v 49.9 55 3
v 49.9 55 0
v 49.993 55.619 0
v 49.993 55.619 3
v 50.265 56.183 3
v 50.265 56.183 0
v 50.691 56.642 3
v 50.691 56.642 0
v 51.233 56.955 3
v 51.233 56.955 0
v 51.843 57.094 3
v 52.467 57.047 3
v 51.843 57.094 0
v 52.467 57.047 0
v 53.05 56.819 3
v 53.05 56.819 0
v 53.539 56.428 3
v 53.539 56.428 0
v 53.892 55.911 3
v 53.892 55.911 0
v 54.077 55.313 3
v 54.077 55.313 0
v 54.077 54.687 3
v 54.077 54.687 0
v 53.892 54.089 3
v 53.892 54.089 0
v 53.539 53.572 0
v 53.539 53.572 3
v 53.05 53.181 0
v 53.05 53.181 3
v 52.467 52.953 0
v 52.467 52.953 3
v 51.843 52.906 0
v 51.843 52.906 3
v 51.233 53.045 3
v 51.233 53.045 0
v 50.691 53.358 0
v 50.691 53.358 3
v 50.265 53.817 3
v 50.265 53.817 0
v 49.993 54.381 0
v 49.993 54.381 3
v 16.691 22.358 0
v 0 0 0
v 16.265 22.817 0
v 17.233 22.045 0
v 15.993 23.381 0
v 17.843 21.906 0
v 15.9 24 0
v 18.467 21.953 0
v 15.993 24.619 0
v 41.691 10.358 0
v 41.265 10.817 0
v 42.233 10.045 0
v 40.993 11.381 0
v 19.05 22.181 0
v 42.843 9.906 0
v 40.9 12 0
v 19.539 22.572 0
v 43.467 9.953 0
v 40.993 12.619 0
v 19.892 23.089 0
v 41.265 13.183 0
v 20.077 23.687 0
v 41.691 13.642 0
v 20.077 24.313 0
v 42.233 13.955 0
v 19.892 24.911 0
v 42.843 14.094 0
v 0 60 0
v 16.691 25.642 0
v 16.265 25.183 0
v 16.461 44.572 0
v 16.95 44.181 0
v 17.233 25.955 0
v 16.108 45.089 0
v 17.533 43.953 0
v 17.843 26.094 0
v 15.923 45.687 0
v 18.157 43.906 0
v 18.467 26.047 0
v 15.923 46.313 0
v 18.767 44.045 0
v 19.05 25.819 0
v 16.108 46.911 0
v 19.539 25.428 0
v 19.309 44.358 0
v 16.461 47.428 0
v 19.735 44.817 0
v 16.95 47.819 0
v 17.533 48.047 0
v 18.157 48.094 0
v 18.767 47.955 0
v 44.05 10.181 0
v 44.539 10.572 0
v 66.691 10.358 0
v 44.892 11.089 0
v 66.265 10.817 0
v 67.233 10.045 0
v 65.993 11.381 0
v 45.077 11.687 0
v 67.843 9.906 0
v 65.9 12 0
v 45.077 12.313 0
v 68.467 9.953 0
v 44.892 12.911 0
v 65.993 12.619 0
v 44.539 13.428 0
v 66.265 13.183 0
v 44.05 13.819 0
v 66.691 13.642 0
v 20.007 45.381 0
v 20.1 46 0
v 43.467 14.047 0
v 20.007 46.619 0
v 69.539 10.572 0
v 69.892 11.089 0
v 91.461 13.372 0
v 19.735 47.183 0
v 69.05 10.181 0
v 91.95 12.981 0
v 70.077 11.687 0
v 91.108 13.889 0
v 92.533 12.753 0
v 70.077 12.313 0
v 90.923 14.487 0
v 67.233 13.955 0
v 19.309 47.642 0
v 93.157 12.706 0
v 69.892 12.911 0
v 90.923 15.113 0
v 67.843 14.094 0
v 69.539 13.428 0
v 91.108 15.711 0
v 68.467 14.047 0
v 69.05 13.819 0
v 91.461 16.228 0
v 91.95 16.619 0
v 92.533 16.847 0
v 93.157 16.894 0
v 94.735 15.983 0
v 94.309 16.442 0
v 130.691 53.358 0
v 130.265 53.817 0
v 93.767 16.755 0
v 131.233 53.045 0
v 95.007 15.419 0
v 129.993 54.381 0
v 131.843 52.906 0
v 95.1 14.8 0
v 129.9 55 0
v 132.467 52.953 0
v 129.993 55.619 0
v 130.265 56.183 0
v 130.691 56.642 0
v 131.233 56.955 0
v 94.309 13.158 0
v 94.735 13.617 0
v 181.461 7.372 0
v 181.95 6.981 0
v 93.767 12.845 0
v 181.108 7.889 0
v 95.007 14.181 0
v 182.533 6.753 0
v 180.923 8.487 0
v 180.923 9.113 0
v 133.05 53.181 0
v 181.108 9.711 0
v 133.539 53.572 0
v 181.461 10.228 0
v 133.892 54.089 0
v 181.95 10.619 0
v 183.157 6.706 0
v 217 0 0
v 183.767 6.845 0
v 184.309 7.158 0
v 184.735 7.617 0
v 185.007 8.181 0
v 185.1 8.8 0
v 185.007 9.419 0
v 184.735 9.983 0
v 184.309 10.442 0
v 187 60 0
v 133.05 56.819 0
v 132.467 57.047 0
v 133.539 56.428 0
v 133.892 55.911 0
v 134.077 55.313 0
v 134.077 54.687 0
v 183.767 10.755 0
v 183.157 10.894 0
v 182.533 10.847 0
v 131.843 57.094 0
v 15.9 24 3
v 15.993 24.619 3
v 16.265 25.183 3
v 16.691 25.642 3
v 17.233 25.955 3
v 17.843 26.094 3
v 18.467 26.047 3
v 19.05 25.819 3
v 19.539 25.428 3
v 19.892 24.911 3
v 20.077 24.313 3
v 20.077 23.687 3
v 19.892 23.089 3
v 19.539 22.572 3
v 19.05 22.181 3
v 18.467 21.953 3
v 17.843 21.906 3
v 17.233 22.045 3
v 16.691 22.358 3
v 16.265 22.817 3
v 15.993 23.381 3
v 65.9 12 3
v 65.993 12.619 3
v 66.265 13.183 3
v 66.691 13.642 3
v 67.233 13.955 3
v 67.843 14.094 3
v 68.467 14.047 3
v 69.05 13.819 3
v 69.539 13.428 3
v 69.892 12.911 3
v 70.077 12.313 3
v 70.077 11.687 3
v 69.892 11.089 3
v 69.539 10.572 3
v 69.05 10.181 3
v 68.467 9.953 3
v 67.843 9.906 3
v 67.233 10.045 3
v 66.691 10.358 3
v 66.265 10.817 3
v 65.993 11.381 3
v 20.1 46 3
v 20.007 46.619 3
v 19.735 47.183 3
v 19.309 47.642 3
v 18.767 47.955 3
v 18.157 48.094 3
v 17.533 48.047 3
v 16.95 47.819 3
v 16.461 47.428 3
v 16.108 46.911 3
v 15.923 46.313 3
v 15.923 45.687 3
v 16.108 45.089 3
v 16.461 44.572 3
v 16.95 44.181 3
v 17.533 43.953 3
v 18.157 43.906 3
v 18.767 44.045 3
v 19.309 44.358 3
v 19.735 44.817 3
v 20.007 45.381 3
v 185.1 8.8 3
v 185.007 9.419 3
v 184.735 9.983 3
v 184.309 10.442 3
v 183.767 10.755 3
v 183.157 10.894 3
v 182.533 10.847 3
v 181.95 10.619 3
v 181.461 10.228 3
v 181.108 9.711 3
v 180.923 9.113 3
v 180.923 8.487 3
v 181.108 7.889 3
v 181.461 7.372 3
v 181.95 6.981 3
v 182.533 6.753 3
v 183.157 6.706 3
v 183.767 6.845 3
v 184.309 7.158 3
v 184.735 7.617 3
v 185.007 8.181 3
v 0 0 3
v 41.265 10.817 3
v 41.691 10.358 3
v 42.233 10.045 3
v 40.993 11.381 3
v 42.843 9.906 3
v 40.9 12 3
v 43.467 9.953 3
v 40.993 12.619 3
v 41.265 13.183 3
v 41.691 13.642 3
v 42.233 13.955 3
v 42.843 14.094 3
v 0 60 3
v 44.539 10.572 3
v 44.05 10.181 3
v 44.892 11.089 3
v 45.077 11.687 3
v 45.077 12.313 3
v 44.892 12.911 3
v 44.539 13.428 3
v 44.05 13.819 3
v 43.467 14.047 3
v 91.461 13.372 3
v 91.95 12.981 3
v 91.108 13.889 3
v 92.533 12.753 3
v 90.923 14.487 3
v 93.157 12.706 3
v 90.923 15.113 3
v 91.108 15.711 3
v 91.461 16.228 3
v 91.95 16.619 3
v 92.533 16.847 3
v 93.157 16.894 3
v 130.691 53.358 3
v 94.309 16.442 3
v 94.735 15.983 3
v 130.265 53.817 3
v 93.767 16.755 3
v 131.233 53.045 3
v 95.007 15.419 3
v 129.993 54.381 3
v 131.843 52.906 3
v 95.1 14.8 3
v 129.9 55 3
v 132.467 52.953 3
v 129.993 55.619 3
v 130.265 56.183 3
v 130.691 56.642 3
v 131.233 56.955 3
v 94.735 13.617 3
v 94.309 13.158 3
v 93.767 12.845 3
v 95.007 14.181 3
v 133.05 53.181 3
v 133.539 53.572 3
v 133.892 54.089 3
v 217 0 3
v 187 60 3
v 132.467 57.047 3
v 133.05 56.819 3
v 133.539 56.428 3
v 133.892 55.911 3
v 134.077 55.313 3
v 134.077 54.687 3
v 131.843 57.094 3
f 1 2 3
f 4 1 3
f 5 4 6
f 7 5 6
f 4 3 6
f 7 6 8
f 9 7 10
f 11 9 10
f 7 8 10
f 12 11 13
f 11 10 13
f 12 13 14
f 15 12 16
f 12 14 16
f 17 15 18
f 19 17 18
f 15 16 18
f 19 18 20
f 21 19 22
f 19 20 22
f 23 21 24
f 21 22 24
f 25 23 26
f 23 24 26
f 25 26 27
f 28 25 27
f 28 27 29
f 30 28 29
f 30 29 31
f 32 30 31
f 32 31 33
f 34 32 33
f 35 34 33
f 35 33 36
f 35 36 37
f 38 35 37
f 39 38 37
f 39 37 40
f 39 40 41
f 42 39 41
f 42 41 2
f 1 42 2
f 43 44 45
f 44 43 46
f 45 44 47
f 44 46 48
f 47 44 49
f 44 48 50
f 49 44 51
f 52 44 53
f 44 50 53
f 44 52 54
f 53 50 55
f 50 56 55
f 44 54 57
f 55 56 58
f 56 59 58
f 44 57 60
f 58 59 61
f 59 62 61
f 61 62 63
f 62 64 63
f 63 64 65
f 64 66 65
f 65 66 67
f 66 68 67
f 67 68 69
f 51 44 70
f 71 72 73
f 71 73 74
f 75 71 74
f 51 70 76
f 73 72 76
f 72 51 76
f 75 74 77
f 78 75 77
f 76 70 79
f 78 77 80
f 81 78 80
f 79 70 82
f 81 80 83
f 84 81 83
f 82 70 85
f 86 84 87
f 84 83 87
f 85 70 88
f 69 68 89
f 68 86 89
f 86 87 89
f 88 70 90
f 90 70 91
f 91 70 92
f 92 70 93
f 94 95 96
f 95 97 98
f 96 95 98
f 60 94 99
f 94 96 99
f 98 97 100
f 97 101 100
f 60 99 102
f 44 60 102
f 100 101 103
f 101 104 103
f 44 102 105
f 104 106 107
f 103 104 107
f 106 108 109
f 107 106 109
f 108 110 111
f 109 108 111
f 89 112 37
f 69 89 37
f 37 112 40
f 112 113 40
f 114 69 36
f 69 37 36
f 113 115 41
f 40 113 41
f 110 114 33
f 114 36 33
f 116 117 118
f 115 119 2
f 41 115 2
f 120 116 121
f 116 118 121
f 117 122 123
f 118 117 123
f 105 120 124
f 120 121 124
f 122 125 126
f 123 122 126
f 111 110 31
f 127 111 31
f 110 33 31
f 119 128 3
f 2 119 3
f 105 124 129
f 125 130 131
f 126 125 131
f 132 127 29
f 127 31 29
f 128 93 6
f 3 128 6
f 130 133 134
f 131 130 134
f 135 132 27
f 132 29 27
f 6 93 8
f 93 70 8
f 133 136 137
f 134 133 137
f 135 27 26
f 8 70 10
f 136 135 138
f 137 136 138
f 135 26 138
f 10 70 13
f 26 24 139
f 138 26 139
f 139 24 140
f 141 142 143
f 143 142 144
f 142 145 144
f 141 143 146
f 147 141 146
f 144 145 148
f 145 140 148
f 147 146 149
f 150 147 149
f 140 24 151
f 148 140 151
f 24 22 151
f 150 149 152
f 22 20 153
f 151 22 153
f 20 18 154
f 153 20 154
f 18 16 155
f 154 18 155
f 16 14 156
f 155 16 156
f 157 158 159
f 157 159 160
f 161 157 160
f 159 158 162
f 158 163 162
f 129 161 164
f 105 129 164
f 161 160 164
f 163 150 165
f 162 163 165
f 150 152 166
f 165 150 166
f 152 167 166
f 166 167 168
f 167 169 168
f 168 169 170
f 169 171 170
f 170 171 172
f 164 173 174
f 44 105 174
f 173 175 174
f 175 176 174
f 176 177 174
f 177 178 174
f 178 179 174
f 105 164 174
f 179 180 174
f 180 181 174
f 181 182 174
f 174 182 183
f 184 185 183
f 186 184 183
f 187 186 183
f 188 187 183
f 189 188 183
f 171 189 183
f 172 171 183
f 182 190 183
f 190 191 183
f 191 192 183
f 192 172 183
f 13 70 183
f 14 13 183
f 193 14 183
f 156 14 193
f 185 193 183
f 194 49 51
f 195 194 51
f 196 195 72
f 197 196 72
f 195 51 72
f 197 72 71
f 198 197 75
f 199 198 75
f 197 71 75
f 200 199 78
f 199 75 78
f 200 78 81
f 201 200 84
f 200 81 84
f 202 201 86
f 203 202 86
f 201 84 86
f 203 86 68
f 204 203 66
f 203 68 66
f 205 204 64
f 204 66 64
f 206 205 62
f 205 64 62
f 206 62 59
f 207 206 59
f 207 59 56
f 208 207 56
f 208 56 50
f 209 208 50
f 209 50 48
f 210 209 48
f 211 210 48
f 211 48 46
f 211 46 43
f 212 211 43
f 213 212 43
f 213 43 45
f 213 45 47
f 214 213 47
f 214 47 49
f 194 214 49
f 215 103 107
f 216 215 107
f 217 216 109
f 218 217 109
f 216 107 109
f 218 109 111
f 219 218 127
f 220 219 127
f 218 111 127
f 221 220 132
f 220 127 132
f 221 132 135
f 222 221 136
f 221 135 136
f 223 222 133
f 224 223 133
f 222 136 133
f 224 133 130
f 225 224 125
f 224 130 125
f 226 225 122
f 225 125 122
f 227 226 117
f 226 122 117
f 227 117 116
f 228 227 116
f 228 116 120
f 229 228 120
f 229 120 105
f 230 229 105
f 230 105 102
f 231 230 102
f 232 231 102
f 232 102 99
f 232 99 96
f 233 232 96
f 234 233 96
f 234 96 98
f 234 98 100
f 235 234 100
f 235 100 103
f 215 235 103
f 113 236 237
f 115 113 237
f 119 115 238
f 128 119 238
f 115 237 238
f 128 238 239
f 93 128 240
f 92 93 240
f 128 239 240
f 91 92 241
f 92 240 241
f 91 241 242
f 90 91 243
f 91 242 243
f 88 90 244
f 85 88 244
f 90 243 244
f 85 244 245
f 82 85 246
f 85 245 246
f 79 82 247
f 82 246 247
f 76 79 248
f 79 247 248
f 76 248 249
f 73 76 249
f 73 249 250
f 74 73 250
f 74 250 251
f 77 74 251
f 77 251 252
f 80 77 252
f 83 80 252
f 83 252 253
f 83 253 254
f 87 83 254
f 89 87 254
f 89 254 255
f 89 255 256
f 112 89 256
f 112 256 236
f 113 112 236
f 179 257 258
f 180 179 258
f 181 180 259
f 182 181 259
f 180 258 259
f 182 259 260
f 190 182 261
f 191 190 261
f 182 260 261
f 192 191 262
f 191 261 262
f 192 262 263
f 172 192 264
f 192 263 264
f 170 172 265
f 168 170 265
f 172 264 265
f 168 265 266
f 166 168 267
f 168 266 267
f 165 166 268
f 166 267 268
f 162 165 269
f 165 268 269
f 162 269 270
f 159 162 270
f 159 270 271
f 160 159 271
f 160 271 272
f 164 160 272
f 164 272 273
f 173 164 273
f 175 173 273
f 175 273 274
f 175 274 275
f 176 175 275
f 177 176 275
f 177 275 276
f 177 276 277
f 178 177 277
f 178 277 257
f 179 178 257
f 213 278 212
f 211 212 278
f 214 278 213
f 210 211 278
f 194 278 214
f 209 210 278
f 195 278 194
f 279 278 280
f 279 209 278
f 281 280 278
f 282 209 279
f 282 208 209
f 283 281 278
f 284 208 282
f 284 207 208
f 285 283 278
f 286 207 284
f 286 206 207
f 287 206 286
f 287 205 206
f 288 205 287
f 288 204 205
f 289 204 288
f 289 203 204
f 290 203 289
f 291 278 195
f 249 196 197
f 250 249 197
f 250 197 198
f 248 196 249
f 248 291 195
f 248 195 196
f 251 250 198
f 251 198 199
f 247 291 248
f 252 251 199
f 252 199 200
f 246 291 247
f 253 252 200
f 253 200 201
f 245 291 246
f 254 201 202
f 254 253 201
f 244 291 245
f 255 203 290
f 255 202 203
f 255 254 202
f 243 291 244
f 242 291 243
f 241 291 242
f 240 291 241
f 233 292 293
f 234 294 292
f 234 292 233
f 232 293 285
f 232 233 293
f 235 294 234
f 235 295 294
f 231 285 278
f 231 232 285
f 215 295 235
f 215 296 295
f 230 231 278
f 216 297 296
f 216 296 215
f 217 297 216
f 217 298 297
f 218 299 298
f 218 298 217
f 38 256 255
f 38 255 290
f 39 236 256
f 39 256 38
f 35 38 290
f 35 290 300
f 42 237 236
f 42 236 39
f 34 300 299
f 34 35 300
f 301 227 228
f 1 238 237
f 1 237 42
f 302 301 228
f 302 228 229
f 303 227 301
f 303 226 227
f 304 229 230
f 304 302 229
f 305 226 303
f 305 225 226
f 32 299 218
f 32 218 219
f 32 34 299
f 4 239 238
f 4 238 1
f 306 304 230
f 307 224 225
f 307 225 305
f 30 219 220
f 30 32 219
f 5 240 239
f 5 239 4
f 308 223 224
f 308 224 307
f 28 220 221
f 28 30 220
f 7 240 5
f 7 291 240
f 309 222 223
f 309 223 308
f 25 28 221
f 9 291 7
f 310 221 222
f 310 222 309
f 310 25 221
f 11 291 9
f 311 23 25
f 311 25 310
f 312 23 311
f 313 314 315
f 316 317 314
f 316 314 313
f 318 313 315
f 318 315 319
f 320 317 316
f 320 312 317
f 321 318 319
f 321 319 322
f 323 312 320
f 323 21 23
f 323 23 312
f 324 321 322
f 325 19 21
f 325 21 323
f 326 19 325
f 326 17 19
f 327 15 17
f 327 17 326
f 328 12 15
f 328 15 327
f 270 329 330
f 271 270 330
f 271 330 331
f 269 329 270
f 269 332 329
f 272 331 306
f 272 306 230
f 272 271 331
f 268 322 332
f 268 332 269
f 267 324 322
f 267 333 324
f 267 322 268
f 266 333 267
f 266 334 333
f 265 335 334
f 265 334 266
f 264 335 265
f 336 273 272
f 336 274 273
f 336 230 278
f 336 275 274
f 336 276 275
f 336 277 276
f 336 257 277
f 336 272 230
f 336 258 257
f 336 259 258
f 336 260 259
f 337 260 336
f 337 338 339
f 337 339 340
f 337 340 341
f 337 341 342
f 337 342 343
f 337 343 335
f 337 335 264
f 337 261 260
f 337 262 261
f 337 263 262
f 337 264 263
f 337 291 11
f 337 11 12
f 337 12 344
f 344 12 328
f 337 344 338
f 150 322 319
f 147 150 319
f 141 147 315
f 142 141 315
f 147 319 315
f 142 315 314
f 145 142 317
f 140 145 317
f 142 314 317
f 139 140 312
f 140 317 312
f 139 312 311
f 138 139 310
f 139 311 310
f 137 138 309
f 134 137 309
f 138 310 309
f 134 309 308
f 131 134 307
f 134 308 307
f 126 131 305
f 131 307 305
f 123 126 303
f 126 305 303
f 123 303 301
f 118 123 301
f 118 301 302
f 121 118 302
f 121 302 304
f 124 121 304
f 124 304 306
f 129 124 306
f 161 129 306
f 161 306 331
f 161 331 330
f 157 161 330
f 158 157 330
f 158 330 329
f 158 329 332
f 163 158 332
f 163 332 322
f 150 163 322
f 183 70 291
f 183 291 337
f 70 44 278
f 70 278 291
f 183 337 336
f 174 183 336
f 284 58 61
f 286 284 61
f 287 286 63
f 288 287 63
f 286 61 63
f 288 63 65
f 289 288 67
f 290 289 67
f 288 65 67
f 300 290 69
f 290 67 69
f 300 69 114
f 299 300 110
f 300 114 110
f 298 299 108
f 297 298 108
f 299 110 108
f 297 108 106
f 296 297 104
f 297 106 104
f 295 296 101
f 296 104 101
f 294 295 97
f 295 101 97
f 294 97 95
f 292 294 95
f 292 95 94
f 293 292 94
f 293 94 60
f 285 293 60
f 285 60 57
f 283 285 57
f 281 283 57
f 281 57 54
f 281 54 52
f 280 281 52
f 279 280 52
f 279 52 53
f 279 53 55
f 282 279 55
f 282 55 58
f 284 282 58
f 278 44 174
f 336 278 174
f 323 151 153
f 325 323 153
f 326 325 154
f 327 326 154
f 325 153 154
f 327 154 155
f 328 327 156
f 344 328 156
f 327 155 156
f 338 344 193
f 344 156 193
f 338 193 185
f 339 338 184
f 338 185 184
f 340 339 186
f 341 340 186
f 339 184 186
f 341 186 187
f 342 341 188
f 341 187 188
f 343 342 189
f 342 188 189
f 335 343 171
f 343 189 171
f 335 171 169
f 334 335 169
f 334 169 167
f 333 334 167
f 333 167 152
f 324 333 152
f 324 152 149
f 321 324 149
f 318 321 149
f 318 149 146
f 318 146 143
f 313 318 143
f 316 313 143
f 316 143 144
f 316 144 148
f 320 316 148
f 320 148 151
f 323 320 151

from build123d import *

# Parameters (mm, degrees)
SZKIC1_W                    = 217
SZKIC1_H                    = 60
DODANIE_WYCI_GNI_CIE1_DEPTH = 3
WYTNIJ_WYCI_GNI_CIE1_DEPTH  = 226.162163784
SZKIC3_R                    = 2.1
WYTNIJ_WYCI_GNI_CIE2_DEPTH  = 226.162163784
SZKIC4_R                    = 2.1
WYTNIJ_WYCI_GNI_CIE3_DEPTH  = 226.162163784
SZKIC5_R                    = 2.1
WYTNIJ_WYCI_GNI_CIE4_DEPTH  = 226.162163784
SZKIC6_R                    = 2.1
WYTNIJ_WYCI_GNI_CIE5_DEPTH  = 226.162163784


with BuildPart() as part:
    # Szkic1 → Dodanie-wyciągnięcie1 (new body)
    with BuildSketch(Plane.XY):
        with Locations((108.5, 30)):
            Rectangle(SZKIC1_W, SZKIC1_H)
    extrude(amount=DODANIE_WYCI_GNI_CIE1_DEPTH)

    # Szkic2 → Wytnij-wyciągnięcie1 (cut, through all)
    with BuildSketch(Plane.XY.offset(3)):
        Polygon((187, 60), (217, 0), (217, 60), align=None)
    extrude(amount=-WYTNIJ_WYCI_GNI_CIE1_DEPTH, mode=Mode.SUBTRACT)

    # Szkic3 → Wytnij-wyciągnięcie2 (cut, through all)
    with BuildSketch(Plane(origin=(0, 0, 0), x_dir=(-1, 0, 0), z_dir=(0, 0, -1))):
        with Locations((-18, 24)):
            Circle(SZKIC3_R)
        with Locations((-43, 12)):
            Circle(SZKIC3_R)
        with Locations((-68, 12)):
            Circle(SZKIC3_R)
    extrude(amount=-WYTNIJ_WYCI_GNI_CIE2_DEPTH, mode=Mode.SUBTRACT)

    # Szkic4 → Wytnij-wyciągnięcie3 (cut, through all)
    with BuildSketch(Plane.XY.offset(3)):
        with Locations((93, 14.8)):
            Circle(SZKIC4_R)
        with Locations((183, 8.8)):
            Circle(SZKIC4_R)
    extrude(amount=-WYTNIJ_WYCI_GNI_CIE3_DEPTH, mode=Mode.SUBTRACT)

    # Szkic5 → Wytnij-wyciągnięcie4 (cut, through all)
    with BuildSketch(Plane.XY.offset(3)):
        with Locations((18, 46)):
            Circle(SZKIC5_R)
    extrude(amount=-WYTNIJ_WYCI_GNI_CIE4_DEPTH, mode=Mode.SUBTRACT)

    # Szkic6 → Wytnij-wyciągnięcie5 (cut, through all)
    with BuildSketch(Plane(origin=(0, 0, 0), x_dir=(-1, 0, 0), z_dir=(0, 0, -1))):
        with Locations((-52, 55)):
            Circle(SZKIC6_R)
        with Locations((-132, 55)):
            Circle(SZKIC6_R)
    extrude(amount=-WYTNIJ_WYCI_GNI_CIE5_DEPTH, mode=Mode.SUBTRACT)


solid = part.part
